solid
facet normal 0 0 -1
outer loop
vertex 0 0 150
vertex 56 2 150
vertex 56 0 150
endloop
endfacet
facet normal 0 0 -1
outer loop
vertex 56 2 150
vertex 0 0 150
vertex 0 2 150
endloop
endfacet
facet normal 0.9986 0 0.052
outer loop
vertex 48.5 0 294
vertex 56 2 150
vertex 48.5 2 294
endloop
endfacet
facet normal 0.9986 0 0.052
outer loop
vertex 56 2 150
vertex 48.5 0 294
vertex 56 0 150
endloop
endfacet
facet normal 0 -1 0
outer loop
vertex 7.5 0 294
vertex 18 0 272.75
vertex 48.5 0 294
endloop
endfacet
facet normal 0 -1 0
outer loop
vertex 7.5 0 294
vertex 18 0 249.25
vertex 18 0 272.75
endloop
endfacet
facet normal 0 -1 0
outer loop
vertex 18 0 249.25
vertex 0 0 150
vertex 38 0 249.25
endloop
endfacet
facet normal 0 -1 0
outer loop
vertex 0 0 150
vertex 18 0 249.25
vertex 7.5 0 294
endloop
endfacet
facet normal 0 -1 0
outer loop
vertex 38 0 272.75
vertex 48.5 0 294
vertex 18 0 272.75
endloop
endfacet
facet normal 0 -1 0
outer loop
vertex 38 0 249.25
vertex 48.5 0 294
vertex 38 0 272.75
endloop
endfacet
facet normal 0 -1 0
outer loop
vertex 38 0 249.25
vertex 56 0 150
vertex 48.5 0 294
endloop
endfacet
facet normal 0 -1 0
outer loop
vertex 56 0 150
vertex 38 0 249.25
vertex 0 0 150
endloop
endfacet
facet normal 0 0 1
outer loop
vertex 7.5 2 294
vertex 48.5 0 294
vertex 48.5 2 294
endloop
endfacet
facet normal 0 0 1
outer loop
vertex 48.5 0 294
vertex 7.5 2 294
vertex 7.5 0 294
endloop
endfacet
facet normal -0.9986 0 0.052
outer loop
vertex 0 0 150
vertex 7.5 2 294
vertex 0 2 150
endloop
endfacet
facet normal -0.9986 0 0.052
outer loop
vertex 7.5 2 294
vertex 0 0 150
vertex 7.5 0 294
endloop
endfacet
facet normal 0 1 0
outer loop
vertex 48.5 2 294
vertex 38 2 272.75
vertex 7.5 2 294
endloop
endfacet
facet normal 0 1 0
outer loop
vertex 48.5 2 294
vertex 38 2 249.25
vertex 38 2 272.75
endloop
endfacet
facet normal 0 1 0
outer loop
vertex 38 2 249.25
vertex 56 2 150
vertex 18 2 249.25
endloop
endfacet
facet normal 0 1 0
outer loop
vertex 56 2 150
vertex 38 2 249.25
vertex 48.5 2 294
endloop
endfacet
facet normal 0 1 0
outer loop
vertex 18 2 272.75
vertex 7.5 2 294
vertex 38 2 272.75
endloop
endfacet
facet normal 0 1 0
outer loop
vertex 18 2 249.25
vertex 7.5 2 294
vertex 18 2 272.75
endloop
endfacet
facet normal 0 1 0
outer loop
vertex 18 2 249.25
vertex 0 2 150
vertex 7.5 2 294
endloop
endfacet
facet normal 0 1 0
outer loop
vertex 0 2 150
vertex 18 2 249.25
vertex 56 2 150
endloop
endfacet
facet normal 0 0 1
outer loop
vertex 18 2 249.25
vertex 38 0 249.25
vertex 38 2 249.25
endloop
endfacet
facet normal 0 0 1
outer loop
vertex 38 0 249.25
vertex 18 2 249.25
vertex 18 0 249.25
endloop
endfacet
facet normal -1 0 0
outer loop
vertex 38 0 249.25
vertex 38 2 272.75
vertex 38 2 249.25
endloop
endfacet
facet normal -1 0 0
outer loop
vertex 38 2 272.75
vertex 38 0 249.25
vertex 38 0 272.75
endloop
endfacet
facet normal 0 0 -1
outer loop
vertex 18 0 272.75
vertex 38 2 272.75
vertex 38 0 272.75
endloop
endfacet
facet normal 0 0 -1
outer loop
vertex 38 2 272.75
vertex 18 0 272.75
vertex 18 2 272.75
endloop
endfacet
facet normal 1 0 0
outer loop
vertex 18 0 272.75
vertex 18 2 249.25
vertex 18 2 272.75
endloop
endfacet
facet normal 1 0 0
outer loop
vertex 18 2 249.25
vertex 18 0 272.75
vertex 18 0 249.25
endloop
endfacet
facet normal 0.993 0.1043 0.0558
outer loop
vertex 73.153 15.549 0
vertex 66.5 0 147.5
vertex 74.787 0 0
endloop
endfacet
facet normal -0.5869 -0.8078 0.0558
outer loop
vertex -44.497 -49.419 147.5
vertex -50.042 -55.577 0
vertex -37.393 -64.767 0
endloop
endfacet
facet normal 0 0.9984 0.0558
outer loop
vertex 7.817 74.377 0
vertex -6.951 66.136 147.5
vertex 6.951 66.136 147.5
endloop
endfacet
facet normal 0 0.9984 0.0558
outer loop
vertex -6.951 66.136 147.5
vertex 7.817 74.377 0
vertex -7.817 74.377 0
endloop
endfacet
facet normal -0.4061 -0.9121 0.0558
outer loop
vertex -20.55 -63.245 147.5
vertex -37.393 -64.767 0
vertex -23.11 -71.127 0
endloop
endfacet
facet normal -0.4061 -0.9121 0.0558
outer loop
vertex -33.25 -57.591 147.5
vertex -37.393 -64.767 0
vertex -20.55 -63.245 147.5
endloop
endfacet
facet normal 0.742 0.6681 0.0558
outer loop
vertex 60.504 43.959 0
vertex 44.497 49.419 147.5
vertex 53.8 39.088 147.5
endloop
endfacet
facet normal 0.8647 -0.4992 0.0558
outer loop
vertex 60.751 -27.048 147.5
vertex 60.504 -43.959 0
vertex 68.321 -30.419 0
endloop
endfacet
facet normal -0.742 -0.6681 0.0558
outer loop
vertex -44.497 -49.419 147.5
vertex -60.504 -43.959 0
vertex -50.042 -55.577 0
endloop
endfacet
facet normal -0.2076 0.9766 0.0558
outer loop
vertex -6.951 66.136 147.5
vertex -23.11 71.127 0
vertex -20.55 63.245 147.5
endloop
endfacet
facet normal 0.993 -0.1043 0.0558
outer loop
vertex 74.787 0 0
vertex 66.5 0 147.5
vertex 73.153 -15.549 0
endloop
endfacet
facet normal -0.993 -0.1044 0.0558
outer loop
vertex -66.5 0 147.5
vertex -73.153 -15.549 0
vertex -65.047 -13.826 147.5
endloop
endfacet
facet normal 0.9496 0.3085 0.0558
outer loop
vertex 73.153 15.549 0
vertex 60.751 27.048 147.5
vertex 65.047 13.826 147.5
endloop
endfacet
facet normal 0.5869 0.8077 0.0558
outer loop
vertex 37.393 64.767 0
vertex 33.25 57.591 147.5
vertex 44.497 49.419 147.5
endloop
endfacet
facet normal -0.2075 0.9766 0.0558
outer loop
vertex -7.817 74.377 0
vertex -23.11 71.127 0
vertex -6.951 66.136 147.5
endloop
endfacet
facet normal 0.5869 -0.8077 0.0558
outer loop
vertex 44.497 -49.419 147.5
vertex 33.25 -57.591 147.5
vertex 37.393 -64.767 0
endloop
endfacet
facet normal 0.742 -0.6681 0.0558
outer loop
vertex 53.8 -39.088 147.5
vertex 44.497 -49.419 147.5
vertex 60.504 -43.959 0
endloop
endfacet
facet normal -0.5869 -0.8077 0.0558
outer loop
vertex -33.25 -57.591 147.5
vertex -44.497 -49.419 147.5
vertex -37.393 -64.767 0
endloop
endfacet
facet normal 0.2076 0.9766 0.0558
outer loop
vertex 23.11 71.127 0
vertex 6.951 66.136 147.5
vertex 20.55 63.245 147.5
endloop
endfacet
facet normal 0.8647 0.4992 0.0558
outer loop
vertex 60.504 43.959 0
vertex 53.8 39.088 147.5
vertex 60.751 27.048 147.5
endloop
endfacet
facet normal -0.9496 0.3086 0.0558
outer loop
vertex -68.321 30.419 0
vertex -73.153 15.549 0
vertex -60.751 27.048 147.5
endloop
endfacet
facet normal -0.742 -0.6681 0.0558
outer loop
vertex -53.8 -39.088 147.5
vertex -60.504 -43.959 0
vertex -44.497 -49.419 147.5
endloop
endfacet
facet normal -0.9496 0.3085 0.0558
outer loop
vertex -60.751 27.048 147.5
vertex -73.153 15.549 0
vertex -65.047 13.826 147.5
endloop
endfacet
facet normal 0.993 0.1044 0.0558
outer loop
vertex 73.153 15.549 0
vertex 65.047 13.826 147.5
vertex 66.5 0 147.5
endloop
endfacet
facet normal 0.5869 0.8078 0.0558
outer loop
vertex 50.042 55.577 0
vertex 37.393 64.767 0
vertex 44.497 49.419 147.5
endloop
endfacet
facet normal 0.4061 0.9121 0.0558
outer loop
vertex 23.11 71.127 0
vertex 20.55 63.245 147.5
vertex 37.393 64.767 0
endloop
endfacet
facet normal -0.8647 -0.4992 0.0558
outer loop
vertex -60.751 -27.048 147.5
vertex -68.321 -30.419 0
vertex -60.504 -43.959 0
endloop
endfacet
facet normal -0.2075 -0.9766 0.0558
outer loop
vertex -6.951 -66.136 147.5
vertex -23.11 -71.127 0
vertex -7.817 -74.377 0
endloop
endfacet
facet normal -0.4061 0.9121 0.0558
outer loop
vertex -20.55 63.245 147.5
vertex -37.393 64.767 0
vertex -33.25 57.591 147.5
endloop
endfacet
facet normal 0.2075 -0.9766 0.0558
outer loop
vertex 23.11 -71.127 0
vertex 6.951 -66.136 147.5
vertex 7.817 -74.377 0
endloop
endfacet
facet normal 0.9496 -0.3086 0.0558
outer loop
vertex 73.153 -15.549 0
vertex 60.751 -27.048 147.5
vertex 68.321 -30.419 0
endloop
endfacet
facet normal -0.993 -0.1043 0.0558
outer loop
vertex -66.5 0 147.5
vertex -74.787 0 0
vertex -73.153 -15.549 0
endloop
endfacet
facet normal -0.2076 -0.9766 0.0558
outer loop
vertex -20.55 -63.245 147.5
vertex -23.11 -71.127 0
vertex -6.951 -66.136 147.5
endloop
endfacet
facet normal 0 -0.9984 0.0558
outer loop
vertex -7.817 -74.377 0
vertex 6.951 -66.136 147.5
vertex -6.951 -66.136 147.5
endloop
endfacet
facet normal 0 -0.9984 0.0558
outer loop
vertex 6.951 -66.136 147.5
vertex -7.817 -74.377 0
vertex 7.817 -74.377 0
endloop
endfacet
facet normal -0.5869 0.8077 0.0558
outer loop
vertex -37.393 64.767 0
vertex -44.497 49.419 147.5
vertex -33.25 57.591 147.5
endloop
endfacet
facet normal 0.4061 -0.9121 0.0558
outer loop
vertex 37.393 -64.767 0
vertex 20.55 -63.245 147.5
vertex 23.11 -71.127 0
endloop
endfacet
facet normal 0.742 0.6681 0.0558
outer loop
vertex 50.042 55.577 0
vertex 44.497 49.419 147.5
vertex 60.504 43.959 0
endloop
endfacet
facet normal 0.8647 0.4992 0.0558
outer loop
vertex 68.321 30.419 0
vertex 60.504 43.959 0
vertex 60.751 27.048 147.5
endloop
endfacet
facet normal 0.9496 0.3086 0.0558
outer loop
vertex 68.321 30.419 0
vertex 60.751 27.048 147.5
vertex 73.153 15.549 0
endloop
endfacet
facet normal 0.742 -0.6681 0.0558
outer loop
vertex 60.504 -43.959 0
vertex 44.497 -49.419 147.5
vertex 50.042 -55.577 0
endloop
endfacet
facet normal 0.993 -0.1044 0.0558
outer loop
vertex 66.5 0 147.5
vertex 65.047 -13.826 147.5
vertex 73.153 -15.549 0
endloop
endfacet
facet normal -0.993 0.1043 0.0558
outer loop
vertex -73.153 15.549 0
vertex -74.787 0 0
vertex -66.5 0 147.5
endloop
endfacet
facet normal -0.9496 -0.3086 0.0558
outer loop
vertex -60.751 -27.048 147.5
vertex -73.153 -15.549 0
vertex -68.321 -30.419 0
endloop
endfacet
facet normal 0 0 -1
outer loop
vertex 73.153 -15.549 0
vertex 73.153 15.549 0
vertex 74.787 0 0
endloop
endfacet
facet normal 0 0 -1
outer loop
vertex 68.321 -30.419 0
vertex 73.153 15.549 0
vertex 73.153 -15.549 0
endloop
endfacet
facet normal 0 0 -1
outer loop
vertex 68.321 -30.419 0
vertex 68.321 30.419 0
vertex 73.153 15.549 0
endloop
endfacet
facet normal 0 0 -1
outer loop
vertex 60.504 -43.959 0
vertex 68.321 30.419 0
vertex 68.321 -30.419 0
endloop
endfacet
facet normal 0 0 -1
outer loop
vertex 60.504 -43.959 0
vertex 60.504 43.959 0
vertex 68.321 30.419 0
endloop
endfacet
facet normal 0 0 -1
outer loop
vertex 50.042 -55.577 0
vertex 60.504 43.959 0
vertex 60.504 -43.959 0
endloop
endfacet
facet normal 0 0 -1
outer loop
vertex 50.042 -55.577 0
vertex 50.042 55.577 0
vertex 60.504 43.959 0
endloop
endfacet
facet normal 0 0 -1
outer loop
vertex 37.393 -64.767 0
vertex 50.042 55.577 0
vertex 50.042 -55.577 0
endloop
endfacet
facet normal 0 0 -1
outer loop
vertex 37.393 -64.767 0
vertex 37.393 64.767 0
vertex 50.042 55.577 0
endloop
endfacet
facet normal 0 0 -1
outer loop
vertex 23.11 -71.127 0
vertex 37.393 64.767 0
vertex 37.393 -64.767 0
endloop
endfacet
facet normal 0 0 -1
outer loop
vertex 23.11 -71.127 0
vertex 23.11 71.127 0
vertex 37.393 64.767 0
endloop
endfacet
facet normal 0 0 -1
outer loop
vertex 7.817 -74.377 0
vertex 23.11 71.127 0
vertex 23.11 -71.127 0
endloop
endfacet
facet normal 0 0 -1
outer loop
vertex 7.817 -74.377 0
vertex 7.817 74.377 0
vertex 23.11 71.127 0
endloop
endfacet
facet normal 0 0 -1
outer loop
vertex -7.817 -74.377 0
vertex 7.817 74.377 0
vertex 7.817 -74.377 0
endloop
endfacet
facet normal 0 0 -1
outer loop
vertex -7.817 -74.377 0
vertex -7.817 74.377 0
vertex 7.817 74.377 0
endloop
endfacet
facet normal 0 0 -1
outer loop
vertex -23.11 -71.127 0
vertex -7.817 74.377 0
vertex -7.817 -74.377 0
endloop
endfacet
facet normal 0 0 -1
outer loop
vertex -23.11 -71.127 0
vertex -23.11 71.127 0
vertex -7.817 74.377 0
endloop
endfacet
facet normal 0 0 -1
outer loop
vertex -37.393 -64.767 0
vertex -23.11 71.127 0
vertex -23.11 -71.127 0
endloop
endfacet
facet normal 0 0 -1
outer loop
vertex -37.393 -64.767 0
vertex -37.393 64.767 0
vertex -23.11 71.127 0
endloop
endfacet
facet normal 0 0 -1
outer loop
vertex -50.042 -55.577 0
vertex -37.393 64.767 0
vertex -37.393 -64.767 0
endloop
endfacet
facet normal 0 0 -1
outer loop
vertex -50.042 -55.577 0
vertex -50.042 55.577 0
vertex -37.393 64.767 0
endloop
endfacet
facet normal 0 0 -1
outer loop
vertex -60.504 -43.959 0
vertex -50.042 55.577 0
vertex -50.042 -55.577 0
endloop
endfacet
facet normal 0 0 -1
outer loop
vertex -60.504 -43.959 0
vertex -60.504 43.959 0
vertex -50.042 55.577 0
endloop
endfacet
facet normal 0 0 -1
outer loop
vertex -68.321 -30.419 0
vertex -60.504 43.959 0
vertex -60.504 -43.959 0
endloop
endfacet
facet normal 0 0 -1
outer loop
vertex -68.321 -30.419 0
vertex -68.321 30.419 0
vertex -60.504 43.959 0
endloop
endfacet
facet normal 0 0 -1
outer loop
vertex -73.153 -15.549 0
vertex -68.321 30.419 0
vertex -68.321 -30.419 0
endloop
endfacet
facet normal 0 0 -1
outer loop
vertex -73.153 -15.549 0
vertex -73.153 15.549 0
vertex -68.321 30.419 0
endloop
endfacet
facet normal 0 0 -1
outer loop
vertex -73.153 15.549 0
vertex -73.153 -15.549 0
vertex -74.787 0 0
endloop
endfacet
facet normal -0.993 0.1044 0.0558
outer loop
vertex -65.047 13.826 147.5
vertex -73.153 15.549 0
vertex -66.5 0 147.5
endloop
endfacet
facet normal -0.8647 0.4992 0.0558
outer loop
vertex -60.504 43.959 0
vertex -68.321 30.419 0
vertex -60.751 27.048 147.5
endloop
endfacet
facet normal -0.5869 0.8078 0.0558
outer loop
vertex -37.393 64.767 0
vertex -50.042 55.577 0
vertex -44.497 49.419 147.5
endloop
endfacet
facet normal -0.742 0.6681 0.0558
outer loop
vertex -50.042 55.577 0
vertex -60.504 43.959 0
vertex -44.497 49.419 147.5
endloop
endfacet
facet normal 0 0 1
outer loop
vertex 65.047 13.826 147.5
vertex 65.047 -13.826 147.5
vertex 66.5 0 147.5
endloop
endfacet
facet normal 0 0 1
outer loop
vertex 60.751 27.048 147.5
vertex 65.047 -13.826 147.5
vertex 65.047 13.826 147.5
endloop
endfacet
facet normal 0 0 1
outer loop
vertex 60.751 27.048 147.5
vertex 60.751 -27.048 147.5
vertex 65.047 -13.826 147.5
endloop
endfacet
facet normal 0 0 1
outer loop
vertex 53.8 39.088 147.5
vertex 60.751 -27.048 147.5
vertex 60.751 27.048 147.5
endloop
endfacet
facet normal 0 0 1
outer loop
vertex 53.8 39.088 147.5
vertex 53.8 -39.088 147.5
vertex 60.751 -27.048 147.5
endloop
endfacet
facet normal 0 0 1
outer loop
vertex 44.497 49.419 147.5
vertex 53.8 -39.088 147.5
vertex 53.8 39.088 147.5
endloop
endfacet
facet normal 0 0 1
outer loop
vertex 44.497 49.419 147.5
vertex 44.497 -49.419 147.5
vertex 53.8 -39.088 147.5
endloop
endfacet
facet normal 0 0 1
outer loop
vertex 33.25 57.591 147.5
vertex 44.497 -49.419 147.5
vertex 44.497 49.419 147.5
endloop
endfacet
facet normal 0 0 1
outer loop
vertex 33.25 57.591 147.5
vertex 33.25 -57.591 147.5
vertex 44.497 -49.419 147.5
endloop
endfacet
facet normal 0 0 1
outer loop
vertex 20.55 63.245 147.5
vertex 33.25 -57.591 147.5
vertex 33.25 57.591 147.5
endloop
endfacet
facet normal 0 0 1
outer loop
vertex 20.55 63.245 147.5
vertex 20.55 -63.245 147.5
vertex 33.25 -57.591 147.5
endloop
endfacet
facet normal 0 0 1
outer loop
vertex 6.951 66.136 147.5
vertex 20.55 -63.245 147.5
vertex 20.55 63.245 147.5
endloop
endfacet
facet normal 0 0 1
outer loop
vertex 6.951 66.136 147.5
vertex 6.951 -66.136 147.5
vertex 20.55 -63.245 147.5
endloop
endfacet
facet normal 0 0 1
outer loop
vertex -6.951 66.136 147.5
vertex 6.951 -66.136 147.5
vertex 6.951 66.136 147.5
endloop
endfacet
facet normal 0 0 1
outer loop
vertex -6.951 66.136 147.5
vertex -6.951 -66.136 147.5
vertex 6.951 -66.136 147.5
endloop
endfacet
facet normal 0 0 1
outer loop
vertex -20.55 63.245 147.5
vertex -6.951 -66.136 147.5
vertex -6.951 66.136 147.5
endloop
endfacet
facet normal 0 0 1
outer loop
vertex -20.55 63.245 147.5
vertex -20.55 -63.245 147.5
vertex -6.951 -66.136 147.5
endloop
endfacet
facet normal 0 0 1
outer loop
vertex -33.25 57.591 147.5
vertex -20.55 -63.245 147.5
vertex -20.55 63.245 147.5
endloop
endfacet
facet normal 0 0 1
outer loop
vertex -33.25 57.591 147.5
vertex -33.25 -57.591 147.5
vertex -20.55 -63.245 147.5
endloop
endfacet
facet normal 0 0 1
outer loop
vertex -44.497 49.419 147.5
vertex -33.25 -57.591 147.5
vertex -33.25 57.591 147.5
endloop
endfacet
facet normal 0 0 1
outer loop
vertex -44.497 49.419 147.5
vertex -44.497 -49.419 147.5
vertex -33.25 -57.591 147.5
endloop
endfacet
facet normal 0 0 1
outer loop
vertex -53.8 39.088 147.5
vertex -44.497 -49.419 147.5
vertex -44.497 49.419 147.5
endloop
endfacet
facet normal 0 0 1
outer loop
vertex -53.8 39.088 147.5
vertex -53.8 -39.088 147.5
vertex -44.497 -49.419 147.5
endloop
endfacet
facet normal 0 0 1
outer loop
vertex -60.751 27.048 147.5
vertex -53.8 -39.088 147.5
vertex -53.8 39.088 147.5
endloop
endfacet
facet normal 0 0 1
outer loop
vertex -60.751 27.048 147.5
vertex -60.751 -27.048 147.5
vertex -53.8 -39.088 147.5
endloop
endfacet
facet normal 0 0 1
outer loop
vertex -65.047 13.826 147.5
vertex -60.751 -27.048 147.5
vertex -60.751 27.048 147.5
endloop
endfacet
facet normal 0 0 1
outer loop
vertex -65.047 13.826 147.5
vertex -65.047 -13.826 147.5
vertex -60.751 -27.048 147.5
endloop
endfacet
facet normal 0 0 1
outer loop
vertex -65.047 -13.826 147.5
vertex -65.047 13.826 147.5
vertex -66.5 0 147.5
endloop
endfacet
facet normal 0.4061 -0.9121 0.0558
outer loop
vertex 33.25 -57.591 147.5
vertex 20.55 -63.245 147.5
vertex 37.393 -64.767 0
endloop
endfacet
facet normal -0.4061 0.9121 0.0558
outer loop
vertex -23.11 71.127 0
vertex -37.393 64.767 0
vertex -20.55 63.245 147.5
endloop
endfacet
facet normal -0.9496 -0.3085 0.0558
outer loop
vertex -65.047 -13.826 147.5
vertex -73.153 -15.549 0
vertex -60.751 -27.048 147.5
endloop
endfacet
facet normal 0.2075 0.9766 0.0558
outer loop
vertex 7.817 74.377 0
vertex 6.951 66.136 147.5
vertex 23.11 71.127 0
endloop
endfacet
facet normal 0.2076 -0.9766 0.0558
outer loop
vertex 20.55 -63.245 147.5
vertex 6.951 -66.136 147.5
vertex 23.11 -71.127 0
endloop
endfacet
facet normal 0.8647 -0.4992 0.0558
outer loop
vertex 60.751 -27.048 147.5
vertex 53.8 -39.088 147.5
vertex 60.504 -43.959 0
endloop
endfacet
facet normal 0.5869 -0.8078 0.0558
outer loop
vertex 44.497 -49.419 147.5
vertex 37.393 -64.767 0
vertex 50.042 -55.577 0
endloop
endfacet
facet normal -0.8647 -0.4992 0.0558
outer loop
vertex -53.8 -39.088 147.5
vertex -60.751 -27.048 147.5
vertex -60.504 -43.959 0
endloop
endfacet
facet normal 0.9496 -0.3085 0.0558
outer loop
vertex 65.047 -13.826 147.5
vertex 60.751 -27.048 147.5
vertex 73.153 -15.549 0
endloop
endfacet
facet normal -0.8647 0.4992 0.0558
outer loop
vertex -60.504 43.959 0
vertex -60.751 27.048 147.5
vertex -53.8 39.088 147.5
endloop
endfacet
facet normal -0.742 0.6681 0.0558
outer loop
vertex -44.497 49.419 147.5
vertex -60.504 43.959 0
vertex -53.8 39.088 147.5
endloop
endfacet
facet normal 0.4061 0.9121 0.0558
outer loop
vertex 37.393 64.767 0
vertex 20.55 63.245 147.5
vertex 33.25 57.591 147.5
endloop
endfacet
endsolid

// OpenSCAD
/*
   all units are in mm, things that fell in between a mm line will be noted in a comment
   
   the outside vertical pieces are the same on each side
   the horizontal parts are different sizes 
   
   the entire piece is mirrored around the horizontal center
   
   most of these variables are a result of my measurements of the segments, convenience identifiers below that for easier
   polyhedron definition
 */
outsideVerticalUpper = 11;
outsideVerticalMiddle = 44;
outsideVerticalLower = 89; // minus a hair - 88.8?

outsideHorizontalLower = 56; // plus a hair - 56.2?
outsideHorizontalUpper = 41;

// these chute horizontal sizes aren't actually important but it might be nice to use them to double check that my measurements were correct
// i.e. if the resulting polyhedron isn't this width at this location, I goofed.
chuteHorizontalLower = 47.5; 
chuteHorizontalUpper = 42.5;

// the chute is rectangular
chuteHorizontalInner = 20;
chuteVerticalInner = 23.5;

thickness = 2;

// cone section
// top radius = 133/2
// 469.9mm bottom (circumference)
// 104.775 mm distance

cylinder(h=147.5, r1=74.7869, r2=66.5);

// convenience identifiers 
upper_horizontal_offset = (outsideHorizontalLower - outsideHorizontalUpper) / 2;

plate_front = 0;
plate_back = thickness;
plate_top = outsideVerticalUpper + outsideVerticalMiddle + outsideVerticalLower;
plate_bottom = 0;
plate_bottom_left = 0;
plate_bottom_right = plate_bottom_left + outsideHorizontalLower;
plate_top_left = plate_bottom_left + upper_horizontal_offset;
plate_top_right = outsideHorizontalUpper + upper_horizontal_offset;

middle = outsideHorizontalLower / 2;

chute_vertical_offset = (outsideVerticalMiddle - chuteVerticalInner) / 2;

chute_lower = outsideVerticalLower + chute_vertical_offset;
chute_upper = outsideVerticalLower + outsideVerticalMiddle - chute_vertical_offset;
chute_left = middle - (chuteHorizontalInner / 2);
chute_right = middle + (chuteHorizontalInner / 2);
chute_front = plate_front;
chute_back = plate_back;


plate_points = [
    [plate_bottom_left, plate_front, plate_bottom], // front bottom left [0]
    [plate_bottom_right, plate_front, plate_bottom], // front bottom right [1]
    [plate_bottom_right, plate_back, plate_bottom], // back bottom right [2]
    [plate_bottom_left, plate_back, plate_bottom], // back bottom left [3]
    [plate_top_left, plate_front, plate_top], // front top left [4]
    [plate_top_right, plate_front, plate_top], // front top right [5]
    [plate_top_right, plate_back, plate_top], // back top right [6]
    [plate_top_left, plate_back, plate_top] // back top left [7]
];

plate_faces = [
    [0, 1, 2, 3], // bottom
    [4, 5, 1, 0], // front
    [7, 6, 5, 4], // top
    [5, 6, 2, 1], // right
    [6, 7, 3, 2], // back
    [7, 4, 0, 3]  // left
];

chute_deduction_points = [
    [chute_left, chute_front, chute_lower], // front bottom left [0]
    [chute_right, chute_front, chute_lower], // front bottom right [1]
    [chute_right, chute_back, chute_lower], // back bottom right [2]
    [chute_left, chute_back, chute_lower], // back bottom left [3]
    [chute_left, chute_front, chute_upper], // front top left [4]
    [chute_right, chute_front, chute_upper], // front bottom right [5]
    [chute_right, chute_back, chute_upper], // back bottom right [6]
    [chute_left, chute_back, chute_upper], // back bottom left [7]
];

chute_deduction_faces = [
    [0, 1, 2, 3], // bottom
    [4, 5, 1, 0], // front
    [7, 6, 5, 4], // top
    [5, 6, 2, 1], // right
    [6, 7, 3, 2], // back
    [7, 4, 0, 3]  // left
];

translate(v=[0,0,150])
  difference() {
    polyhedron(plate_points, plate_faces);
    polyhedron(chute_deduction_points, chute_deduction_faces);
  }
